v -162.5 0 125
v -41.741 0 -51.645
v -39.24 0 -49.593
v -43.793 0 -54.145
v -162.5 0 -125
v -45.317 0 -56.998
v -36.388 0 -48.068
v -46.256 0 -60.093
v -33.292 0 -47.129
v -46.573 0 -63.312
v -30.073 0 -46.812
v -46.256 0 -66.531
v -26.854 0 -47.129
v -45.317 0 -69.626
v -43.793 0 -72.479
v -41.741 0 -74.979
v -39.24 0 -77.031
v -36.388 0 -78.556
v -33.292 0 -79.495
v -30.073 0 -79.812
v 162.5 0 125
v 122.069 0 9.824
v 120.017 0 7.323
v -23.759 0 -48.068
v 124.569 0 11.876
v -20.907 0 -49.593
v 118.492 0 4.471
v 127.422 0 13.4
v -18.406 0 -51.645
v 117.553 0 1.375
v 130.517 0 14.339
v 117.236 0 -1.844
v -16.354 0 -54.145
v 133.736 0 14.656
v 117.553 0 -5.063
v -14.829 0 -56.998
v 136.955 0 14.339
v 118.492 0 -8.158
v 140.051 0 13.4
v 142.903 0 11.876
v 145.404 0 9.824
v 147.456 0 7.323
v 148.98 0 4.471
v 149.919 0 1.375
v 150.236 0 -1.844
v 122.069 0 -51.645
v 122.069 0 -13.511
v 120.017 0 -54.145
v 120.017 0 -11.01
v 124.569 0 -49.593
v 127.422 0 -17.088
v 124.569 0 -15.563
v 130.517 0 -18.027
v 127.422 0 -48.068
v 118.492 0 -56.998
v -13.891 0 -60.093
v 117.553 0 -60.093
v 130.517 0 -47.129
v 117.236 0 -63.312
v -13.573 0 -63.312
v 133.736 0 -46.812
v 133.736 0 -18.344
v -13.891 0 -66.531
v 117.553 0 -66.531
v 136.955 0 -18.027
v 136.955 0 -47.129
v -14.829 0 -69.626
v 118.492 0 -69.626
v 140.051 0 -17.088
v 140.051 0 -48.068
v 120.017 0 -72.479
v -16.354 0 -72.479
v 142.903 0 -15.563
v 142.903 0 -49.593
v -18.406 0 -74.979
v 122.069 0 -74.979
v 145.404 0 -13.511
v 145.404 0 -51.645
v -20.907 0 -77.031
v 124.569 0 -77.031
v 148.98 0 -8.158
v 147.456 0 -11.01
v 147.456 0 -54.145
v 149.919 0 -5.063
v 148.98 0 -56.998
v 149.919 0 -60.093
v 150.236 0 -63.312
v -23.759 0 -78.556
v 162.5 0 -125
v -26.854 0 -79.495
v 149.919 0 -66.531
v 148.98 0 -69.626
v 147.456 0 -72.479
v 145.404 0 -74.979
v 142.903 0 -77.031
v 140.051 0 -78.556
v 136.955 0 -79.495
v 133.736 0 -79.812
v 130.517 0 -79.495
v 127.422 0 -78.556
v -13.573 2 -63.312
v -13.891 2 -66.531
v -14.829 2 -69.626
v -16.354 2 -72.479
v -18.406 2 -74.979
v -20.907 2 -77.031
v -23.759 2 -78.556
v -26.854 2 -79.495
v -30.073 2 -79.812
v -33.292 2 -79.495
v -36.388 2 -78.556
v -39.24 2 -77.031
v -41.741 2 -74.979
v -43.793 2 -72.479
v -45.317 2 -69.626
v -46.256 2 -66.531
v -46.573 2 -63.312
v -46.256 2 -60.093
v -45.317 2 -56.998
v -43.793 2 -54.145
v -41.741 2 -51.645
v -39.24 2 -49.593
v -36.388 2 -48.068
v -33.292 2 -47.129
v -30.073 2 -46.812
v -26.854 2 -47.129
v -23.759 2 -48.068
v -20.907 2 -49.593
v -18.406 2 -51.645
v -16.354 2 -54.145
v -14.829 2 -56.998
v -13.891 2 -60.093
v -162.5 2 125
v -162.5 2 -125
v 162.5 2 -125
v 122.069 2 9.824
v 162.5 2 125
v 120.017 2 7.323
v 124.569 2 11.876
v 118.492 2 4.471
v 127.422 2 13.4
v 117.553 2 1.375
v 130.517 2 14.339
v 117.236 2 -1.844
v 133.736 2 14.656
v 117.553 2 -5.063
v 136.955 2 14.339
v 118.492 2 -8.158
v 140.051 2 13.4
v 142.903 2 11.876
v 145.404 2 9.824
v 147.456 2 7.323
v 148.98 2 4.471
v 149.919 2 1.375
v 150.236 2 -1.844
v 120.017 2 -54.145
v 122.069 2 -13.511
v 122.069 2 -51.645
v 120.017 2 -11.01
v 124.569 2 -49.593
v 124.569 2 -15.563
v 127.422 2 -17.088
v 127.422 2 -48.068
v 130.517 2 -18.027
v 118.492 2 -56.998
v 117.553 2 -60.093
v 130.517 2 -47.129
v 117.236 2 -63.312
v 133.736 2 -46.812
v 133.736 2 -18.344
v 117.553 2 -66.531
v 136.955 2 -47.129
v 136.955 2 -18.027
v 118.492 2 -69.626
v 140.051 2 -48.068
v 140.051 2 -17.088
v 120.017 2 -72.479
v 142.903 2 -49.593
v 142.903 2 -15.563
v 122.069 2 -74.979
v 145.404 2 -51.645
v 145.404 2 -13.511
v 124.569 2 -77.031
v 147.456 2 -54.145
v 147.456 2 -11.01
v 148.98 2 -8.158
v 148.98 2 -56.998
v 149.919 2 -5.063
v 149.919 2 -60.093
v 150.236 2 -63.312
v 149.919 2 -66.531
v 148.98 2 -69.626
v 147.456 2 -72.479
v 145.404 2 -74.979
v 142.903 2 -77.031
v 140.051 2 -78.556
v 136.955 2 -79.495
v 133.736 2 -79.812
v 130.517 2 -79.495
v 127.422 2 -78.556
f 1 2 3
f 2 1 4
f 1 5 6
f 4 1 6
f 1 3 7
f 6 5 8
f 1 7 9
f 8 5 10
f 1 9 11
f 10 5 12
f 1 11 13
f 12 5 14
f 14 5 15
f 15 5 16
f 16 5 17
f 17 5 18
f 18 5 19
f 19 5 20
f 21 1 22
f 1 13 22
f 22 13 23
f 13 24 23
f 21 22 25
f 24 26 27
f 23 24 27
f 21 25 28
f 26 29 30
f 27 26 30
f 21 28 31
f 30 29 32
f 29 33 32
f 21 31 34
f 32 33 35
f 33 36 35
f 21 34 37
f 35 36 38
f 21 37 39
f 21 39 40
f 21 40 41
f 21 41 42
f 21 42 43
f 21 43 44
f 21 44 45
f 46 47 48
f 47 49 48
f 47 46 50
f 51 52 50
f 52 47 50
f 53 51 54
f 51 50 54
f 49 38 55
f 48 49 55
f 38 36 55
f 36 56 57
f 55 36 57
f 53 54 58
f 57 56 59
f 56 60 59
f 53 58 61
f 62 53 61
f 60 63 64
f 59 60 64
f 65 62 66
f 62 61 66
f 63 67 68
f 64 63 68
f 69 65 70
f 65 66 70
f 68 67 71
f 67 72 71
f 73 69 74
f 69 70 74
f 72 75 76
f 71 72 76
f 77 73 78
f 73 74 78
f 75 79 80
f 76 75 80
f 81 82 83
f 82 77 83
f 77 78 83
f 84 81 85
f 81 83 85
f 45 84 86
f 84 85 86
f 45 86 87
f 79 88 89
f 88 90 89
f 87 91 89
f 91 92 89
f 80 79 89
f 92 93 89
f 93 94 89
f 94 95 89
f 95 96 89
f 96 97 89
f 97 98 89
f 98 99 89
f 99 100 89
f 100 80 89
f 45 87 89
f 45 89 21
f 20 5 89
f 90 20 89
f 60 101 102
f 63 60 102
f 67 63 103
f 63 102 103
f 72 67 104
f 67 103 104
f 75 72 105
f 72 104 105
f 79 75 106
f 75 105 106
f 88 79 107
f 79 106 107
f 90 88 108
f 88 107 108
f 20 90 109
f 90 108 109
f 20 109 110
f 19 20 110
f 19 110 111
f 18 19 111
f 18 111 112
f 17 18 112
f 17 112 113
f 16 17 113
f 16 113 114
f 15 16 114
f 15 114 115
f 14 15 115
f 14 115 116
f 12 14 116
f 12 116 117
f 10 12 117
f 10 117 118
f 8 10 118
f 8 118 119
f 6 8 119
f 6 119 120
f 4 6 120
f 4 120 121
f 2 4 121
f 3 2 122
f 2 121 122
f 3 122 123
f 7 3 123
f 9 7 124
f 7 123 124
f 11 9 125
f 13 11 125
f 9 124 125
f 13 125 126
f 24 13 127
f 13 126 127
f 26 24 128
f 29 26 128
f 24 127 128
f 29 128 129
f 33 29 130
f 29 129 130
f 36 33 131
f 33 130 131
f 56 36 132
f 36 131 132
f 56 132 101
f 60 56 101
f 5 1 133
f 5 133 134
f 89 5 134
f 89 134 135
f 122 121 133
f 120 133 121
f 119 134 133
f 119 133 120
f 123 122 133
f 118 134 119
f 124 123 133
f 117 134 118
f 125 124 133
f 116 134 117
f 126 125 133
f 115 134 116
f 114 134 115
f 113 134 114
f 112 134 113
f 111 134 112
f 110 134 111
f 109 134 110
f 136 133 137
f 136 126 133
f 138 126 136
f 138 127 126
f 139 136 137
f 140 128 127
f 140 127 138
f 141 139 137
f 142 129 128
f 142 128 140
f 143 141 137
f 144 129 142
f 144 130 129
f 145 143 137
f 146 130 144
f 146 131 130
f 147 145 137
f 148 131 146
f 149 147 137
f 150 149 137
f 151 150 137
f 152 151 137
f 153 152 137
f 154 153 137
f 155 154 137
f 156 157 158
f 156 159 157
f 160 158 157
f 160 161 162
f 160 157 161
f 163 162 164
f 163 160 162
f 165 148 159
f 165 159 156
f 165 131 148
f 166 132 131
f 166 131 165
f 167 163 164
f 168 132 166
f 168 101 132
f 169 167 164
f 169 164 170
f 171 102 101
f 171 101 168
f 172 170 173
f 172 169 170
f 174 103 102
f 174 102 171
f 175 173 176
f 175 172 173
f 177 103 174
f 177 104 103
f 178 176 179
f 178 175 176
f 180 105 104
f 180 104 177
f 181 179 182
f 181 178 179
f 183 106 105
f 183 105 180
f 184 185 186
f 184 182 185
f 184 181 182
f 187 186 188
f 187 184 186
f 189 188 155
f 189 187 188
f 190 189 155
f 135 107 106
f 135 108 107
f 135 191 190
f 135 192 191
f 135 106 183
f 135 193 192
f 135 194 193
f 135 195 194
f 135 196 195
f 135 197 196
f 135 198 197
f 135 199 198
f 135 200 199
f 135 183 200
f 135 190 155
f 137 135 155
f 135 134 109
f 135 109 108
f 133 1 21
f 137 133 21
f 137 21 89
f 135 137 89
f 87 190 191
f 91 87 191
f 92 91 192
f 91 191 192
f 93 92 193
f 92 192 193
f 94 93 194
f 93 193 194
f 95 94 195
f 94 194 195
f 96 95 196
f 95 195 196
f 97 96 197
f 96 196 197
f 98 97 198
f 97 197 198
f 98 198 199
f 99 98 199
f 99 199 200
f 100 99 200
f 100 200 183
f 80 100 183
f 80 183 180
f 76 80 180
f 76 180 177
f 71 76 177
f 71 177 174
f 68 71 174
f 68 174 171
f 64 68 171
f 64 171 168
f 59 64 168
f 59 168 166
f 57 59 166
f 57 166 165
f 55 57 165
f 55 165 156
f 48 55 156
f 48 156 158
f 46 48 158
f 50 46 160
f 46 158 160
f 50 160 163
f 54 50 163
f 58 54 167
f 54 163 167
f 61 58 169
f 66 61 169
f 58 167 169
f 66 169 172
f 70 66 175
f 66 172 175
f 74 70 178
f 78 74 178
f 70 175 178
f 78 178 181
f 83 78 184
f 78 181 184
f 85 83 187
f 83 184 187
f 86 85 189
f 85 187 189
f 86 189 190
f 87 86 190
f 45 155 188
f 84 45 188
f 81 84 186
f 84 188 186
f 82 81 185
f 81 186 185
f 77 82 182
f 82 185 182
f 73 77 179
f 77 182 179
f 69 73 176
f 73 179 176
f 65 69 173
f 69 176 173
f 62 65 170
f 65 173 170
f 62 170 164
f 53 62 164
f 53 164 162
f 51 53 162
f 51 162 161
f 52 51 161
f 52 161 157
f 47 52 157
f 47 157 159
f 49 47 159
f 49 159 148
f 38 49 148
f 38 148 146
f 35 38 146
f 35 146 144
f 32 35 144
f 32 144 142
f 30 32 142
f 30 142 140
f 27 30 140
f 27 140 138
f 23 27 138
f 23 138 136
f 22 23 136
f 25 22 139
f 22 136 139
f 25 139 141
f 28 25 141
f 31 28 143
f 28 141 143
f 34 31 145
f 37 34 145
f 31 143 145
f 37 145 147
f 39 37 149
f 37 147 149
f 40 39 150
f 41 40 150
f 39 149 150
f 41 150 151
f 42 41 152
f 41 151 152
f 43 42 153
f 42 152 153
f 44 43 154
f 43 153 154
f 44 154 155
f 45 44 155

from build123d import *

# Parameters (mm, degrees)
SKETCH1_W           = 325
SKETCH1_H           = 250
BOSS_EXTRUDE1_DEPTH = 2
CUT_EXTRUDE1_REACH  = 4
SKETCH2_R           = 16.5


with BuildPart() as part:
    # Sketch1 → Boss-Extrude1 (new body)
    with BuildSketch(Plane(origin=(0, 0, 0), x_dir=(1, 0, 0), z_dir=(0, 1, 0))):
        Rectangle(SKETCH1_W, SKETCH1_H)
    extrude(amount=BOSS_EXTRUDE1_DEPTH)

    # Sketch2 → Cut-Extrude1 (cut, up to next)
    with BuildSketch(Plane(origin=(0, 2, 0), x_dir=(1, 0, 0), z_dir=(0, 1, 0)), mode=Mode.PRIVATE) as cut_extrude1_sk1:
        with Locations((133.736379862, 1.843557571)):
            Circle(SKETCH2_R)
    cut_extrude1_tool1 = extrude(cut_extrude1_sk1.sketch, amount=-CUT_EXTRUDE1_REACH, mode=Mode.PRIVATE) & part.part
    add(cut_extrude1_tool1.solids().sort_by_distance((133.73638, 2, -1.843558))[0], mode=Mode.SUBTRACT)
    # Sketch2 → Cut-Extrude1 (cut, up to next)
    with BuildSketch(Plane(origin=(0, 2, 0), x_dir=(1, 0, 0), z_dir=(0, 1, 0)), mode=Mode.PRIVATE) as cut_extrude1_sk2:
        with Locations((133.736379862, 63.311910549)):
            Circle(SKETCH2_R)
    cut_extrude1_tool2 = extrude(cut_extrude1_sk2.sketch, amount=-CUT_EXTRUDE1_REACH, mode=Mode.PRIVATE) & part.part
    add(cut_extrude1_tool2.solids().sort_by_distance((133.73638, 2, -63.311911))[0], mode=Mode.SUBTRACT)
    # Sketch2 → Cut-Extrude1 (cut, up to next)
    with BuildSketch(Plane(origin=(0, 2, 0), x_dir=(1, 0, 0), z_dir=(0, 1, 0)), mode=Mode.PRIVATE) as cut_extrude1_sk3:
        with Locations((-30.073468299, 63.311910549)):
            Circle(SKETCH2_R)
    cut_extrude1_tool3 = extrude(cut_extrude1_sk3.sketch, amount=-CUT_EXTRUDE1_REACH, mode=Mode.PRIVATE) & part.part
    add(cut_extrude1_tool3.solids().sort_by_distance((-30.073468, 2, -63.311911))[0], mode=Mode.SUBTRACT)


solid = part.part
